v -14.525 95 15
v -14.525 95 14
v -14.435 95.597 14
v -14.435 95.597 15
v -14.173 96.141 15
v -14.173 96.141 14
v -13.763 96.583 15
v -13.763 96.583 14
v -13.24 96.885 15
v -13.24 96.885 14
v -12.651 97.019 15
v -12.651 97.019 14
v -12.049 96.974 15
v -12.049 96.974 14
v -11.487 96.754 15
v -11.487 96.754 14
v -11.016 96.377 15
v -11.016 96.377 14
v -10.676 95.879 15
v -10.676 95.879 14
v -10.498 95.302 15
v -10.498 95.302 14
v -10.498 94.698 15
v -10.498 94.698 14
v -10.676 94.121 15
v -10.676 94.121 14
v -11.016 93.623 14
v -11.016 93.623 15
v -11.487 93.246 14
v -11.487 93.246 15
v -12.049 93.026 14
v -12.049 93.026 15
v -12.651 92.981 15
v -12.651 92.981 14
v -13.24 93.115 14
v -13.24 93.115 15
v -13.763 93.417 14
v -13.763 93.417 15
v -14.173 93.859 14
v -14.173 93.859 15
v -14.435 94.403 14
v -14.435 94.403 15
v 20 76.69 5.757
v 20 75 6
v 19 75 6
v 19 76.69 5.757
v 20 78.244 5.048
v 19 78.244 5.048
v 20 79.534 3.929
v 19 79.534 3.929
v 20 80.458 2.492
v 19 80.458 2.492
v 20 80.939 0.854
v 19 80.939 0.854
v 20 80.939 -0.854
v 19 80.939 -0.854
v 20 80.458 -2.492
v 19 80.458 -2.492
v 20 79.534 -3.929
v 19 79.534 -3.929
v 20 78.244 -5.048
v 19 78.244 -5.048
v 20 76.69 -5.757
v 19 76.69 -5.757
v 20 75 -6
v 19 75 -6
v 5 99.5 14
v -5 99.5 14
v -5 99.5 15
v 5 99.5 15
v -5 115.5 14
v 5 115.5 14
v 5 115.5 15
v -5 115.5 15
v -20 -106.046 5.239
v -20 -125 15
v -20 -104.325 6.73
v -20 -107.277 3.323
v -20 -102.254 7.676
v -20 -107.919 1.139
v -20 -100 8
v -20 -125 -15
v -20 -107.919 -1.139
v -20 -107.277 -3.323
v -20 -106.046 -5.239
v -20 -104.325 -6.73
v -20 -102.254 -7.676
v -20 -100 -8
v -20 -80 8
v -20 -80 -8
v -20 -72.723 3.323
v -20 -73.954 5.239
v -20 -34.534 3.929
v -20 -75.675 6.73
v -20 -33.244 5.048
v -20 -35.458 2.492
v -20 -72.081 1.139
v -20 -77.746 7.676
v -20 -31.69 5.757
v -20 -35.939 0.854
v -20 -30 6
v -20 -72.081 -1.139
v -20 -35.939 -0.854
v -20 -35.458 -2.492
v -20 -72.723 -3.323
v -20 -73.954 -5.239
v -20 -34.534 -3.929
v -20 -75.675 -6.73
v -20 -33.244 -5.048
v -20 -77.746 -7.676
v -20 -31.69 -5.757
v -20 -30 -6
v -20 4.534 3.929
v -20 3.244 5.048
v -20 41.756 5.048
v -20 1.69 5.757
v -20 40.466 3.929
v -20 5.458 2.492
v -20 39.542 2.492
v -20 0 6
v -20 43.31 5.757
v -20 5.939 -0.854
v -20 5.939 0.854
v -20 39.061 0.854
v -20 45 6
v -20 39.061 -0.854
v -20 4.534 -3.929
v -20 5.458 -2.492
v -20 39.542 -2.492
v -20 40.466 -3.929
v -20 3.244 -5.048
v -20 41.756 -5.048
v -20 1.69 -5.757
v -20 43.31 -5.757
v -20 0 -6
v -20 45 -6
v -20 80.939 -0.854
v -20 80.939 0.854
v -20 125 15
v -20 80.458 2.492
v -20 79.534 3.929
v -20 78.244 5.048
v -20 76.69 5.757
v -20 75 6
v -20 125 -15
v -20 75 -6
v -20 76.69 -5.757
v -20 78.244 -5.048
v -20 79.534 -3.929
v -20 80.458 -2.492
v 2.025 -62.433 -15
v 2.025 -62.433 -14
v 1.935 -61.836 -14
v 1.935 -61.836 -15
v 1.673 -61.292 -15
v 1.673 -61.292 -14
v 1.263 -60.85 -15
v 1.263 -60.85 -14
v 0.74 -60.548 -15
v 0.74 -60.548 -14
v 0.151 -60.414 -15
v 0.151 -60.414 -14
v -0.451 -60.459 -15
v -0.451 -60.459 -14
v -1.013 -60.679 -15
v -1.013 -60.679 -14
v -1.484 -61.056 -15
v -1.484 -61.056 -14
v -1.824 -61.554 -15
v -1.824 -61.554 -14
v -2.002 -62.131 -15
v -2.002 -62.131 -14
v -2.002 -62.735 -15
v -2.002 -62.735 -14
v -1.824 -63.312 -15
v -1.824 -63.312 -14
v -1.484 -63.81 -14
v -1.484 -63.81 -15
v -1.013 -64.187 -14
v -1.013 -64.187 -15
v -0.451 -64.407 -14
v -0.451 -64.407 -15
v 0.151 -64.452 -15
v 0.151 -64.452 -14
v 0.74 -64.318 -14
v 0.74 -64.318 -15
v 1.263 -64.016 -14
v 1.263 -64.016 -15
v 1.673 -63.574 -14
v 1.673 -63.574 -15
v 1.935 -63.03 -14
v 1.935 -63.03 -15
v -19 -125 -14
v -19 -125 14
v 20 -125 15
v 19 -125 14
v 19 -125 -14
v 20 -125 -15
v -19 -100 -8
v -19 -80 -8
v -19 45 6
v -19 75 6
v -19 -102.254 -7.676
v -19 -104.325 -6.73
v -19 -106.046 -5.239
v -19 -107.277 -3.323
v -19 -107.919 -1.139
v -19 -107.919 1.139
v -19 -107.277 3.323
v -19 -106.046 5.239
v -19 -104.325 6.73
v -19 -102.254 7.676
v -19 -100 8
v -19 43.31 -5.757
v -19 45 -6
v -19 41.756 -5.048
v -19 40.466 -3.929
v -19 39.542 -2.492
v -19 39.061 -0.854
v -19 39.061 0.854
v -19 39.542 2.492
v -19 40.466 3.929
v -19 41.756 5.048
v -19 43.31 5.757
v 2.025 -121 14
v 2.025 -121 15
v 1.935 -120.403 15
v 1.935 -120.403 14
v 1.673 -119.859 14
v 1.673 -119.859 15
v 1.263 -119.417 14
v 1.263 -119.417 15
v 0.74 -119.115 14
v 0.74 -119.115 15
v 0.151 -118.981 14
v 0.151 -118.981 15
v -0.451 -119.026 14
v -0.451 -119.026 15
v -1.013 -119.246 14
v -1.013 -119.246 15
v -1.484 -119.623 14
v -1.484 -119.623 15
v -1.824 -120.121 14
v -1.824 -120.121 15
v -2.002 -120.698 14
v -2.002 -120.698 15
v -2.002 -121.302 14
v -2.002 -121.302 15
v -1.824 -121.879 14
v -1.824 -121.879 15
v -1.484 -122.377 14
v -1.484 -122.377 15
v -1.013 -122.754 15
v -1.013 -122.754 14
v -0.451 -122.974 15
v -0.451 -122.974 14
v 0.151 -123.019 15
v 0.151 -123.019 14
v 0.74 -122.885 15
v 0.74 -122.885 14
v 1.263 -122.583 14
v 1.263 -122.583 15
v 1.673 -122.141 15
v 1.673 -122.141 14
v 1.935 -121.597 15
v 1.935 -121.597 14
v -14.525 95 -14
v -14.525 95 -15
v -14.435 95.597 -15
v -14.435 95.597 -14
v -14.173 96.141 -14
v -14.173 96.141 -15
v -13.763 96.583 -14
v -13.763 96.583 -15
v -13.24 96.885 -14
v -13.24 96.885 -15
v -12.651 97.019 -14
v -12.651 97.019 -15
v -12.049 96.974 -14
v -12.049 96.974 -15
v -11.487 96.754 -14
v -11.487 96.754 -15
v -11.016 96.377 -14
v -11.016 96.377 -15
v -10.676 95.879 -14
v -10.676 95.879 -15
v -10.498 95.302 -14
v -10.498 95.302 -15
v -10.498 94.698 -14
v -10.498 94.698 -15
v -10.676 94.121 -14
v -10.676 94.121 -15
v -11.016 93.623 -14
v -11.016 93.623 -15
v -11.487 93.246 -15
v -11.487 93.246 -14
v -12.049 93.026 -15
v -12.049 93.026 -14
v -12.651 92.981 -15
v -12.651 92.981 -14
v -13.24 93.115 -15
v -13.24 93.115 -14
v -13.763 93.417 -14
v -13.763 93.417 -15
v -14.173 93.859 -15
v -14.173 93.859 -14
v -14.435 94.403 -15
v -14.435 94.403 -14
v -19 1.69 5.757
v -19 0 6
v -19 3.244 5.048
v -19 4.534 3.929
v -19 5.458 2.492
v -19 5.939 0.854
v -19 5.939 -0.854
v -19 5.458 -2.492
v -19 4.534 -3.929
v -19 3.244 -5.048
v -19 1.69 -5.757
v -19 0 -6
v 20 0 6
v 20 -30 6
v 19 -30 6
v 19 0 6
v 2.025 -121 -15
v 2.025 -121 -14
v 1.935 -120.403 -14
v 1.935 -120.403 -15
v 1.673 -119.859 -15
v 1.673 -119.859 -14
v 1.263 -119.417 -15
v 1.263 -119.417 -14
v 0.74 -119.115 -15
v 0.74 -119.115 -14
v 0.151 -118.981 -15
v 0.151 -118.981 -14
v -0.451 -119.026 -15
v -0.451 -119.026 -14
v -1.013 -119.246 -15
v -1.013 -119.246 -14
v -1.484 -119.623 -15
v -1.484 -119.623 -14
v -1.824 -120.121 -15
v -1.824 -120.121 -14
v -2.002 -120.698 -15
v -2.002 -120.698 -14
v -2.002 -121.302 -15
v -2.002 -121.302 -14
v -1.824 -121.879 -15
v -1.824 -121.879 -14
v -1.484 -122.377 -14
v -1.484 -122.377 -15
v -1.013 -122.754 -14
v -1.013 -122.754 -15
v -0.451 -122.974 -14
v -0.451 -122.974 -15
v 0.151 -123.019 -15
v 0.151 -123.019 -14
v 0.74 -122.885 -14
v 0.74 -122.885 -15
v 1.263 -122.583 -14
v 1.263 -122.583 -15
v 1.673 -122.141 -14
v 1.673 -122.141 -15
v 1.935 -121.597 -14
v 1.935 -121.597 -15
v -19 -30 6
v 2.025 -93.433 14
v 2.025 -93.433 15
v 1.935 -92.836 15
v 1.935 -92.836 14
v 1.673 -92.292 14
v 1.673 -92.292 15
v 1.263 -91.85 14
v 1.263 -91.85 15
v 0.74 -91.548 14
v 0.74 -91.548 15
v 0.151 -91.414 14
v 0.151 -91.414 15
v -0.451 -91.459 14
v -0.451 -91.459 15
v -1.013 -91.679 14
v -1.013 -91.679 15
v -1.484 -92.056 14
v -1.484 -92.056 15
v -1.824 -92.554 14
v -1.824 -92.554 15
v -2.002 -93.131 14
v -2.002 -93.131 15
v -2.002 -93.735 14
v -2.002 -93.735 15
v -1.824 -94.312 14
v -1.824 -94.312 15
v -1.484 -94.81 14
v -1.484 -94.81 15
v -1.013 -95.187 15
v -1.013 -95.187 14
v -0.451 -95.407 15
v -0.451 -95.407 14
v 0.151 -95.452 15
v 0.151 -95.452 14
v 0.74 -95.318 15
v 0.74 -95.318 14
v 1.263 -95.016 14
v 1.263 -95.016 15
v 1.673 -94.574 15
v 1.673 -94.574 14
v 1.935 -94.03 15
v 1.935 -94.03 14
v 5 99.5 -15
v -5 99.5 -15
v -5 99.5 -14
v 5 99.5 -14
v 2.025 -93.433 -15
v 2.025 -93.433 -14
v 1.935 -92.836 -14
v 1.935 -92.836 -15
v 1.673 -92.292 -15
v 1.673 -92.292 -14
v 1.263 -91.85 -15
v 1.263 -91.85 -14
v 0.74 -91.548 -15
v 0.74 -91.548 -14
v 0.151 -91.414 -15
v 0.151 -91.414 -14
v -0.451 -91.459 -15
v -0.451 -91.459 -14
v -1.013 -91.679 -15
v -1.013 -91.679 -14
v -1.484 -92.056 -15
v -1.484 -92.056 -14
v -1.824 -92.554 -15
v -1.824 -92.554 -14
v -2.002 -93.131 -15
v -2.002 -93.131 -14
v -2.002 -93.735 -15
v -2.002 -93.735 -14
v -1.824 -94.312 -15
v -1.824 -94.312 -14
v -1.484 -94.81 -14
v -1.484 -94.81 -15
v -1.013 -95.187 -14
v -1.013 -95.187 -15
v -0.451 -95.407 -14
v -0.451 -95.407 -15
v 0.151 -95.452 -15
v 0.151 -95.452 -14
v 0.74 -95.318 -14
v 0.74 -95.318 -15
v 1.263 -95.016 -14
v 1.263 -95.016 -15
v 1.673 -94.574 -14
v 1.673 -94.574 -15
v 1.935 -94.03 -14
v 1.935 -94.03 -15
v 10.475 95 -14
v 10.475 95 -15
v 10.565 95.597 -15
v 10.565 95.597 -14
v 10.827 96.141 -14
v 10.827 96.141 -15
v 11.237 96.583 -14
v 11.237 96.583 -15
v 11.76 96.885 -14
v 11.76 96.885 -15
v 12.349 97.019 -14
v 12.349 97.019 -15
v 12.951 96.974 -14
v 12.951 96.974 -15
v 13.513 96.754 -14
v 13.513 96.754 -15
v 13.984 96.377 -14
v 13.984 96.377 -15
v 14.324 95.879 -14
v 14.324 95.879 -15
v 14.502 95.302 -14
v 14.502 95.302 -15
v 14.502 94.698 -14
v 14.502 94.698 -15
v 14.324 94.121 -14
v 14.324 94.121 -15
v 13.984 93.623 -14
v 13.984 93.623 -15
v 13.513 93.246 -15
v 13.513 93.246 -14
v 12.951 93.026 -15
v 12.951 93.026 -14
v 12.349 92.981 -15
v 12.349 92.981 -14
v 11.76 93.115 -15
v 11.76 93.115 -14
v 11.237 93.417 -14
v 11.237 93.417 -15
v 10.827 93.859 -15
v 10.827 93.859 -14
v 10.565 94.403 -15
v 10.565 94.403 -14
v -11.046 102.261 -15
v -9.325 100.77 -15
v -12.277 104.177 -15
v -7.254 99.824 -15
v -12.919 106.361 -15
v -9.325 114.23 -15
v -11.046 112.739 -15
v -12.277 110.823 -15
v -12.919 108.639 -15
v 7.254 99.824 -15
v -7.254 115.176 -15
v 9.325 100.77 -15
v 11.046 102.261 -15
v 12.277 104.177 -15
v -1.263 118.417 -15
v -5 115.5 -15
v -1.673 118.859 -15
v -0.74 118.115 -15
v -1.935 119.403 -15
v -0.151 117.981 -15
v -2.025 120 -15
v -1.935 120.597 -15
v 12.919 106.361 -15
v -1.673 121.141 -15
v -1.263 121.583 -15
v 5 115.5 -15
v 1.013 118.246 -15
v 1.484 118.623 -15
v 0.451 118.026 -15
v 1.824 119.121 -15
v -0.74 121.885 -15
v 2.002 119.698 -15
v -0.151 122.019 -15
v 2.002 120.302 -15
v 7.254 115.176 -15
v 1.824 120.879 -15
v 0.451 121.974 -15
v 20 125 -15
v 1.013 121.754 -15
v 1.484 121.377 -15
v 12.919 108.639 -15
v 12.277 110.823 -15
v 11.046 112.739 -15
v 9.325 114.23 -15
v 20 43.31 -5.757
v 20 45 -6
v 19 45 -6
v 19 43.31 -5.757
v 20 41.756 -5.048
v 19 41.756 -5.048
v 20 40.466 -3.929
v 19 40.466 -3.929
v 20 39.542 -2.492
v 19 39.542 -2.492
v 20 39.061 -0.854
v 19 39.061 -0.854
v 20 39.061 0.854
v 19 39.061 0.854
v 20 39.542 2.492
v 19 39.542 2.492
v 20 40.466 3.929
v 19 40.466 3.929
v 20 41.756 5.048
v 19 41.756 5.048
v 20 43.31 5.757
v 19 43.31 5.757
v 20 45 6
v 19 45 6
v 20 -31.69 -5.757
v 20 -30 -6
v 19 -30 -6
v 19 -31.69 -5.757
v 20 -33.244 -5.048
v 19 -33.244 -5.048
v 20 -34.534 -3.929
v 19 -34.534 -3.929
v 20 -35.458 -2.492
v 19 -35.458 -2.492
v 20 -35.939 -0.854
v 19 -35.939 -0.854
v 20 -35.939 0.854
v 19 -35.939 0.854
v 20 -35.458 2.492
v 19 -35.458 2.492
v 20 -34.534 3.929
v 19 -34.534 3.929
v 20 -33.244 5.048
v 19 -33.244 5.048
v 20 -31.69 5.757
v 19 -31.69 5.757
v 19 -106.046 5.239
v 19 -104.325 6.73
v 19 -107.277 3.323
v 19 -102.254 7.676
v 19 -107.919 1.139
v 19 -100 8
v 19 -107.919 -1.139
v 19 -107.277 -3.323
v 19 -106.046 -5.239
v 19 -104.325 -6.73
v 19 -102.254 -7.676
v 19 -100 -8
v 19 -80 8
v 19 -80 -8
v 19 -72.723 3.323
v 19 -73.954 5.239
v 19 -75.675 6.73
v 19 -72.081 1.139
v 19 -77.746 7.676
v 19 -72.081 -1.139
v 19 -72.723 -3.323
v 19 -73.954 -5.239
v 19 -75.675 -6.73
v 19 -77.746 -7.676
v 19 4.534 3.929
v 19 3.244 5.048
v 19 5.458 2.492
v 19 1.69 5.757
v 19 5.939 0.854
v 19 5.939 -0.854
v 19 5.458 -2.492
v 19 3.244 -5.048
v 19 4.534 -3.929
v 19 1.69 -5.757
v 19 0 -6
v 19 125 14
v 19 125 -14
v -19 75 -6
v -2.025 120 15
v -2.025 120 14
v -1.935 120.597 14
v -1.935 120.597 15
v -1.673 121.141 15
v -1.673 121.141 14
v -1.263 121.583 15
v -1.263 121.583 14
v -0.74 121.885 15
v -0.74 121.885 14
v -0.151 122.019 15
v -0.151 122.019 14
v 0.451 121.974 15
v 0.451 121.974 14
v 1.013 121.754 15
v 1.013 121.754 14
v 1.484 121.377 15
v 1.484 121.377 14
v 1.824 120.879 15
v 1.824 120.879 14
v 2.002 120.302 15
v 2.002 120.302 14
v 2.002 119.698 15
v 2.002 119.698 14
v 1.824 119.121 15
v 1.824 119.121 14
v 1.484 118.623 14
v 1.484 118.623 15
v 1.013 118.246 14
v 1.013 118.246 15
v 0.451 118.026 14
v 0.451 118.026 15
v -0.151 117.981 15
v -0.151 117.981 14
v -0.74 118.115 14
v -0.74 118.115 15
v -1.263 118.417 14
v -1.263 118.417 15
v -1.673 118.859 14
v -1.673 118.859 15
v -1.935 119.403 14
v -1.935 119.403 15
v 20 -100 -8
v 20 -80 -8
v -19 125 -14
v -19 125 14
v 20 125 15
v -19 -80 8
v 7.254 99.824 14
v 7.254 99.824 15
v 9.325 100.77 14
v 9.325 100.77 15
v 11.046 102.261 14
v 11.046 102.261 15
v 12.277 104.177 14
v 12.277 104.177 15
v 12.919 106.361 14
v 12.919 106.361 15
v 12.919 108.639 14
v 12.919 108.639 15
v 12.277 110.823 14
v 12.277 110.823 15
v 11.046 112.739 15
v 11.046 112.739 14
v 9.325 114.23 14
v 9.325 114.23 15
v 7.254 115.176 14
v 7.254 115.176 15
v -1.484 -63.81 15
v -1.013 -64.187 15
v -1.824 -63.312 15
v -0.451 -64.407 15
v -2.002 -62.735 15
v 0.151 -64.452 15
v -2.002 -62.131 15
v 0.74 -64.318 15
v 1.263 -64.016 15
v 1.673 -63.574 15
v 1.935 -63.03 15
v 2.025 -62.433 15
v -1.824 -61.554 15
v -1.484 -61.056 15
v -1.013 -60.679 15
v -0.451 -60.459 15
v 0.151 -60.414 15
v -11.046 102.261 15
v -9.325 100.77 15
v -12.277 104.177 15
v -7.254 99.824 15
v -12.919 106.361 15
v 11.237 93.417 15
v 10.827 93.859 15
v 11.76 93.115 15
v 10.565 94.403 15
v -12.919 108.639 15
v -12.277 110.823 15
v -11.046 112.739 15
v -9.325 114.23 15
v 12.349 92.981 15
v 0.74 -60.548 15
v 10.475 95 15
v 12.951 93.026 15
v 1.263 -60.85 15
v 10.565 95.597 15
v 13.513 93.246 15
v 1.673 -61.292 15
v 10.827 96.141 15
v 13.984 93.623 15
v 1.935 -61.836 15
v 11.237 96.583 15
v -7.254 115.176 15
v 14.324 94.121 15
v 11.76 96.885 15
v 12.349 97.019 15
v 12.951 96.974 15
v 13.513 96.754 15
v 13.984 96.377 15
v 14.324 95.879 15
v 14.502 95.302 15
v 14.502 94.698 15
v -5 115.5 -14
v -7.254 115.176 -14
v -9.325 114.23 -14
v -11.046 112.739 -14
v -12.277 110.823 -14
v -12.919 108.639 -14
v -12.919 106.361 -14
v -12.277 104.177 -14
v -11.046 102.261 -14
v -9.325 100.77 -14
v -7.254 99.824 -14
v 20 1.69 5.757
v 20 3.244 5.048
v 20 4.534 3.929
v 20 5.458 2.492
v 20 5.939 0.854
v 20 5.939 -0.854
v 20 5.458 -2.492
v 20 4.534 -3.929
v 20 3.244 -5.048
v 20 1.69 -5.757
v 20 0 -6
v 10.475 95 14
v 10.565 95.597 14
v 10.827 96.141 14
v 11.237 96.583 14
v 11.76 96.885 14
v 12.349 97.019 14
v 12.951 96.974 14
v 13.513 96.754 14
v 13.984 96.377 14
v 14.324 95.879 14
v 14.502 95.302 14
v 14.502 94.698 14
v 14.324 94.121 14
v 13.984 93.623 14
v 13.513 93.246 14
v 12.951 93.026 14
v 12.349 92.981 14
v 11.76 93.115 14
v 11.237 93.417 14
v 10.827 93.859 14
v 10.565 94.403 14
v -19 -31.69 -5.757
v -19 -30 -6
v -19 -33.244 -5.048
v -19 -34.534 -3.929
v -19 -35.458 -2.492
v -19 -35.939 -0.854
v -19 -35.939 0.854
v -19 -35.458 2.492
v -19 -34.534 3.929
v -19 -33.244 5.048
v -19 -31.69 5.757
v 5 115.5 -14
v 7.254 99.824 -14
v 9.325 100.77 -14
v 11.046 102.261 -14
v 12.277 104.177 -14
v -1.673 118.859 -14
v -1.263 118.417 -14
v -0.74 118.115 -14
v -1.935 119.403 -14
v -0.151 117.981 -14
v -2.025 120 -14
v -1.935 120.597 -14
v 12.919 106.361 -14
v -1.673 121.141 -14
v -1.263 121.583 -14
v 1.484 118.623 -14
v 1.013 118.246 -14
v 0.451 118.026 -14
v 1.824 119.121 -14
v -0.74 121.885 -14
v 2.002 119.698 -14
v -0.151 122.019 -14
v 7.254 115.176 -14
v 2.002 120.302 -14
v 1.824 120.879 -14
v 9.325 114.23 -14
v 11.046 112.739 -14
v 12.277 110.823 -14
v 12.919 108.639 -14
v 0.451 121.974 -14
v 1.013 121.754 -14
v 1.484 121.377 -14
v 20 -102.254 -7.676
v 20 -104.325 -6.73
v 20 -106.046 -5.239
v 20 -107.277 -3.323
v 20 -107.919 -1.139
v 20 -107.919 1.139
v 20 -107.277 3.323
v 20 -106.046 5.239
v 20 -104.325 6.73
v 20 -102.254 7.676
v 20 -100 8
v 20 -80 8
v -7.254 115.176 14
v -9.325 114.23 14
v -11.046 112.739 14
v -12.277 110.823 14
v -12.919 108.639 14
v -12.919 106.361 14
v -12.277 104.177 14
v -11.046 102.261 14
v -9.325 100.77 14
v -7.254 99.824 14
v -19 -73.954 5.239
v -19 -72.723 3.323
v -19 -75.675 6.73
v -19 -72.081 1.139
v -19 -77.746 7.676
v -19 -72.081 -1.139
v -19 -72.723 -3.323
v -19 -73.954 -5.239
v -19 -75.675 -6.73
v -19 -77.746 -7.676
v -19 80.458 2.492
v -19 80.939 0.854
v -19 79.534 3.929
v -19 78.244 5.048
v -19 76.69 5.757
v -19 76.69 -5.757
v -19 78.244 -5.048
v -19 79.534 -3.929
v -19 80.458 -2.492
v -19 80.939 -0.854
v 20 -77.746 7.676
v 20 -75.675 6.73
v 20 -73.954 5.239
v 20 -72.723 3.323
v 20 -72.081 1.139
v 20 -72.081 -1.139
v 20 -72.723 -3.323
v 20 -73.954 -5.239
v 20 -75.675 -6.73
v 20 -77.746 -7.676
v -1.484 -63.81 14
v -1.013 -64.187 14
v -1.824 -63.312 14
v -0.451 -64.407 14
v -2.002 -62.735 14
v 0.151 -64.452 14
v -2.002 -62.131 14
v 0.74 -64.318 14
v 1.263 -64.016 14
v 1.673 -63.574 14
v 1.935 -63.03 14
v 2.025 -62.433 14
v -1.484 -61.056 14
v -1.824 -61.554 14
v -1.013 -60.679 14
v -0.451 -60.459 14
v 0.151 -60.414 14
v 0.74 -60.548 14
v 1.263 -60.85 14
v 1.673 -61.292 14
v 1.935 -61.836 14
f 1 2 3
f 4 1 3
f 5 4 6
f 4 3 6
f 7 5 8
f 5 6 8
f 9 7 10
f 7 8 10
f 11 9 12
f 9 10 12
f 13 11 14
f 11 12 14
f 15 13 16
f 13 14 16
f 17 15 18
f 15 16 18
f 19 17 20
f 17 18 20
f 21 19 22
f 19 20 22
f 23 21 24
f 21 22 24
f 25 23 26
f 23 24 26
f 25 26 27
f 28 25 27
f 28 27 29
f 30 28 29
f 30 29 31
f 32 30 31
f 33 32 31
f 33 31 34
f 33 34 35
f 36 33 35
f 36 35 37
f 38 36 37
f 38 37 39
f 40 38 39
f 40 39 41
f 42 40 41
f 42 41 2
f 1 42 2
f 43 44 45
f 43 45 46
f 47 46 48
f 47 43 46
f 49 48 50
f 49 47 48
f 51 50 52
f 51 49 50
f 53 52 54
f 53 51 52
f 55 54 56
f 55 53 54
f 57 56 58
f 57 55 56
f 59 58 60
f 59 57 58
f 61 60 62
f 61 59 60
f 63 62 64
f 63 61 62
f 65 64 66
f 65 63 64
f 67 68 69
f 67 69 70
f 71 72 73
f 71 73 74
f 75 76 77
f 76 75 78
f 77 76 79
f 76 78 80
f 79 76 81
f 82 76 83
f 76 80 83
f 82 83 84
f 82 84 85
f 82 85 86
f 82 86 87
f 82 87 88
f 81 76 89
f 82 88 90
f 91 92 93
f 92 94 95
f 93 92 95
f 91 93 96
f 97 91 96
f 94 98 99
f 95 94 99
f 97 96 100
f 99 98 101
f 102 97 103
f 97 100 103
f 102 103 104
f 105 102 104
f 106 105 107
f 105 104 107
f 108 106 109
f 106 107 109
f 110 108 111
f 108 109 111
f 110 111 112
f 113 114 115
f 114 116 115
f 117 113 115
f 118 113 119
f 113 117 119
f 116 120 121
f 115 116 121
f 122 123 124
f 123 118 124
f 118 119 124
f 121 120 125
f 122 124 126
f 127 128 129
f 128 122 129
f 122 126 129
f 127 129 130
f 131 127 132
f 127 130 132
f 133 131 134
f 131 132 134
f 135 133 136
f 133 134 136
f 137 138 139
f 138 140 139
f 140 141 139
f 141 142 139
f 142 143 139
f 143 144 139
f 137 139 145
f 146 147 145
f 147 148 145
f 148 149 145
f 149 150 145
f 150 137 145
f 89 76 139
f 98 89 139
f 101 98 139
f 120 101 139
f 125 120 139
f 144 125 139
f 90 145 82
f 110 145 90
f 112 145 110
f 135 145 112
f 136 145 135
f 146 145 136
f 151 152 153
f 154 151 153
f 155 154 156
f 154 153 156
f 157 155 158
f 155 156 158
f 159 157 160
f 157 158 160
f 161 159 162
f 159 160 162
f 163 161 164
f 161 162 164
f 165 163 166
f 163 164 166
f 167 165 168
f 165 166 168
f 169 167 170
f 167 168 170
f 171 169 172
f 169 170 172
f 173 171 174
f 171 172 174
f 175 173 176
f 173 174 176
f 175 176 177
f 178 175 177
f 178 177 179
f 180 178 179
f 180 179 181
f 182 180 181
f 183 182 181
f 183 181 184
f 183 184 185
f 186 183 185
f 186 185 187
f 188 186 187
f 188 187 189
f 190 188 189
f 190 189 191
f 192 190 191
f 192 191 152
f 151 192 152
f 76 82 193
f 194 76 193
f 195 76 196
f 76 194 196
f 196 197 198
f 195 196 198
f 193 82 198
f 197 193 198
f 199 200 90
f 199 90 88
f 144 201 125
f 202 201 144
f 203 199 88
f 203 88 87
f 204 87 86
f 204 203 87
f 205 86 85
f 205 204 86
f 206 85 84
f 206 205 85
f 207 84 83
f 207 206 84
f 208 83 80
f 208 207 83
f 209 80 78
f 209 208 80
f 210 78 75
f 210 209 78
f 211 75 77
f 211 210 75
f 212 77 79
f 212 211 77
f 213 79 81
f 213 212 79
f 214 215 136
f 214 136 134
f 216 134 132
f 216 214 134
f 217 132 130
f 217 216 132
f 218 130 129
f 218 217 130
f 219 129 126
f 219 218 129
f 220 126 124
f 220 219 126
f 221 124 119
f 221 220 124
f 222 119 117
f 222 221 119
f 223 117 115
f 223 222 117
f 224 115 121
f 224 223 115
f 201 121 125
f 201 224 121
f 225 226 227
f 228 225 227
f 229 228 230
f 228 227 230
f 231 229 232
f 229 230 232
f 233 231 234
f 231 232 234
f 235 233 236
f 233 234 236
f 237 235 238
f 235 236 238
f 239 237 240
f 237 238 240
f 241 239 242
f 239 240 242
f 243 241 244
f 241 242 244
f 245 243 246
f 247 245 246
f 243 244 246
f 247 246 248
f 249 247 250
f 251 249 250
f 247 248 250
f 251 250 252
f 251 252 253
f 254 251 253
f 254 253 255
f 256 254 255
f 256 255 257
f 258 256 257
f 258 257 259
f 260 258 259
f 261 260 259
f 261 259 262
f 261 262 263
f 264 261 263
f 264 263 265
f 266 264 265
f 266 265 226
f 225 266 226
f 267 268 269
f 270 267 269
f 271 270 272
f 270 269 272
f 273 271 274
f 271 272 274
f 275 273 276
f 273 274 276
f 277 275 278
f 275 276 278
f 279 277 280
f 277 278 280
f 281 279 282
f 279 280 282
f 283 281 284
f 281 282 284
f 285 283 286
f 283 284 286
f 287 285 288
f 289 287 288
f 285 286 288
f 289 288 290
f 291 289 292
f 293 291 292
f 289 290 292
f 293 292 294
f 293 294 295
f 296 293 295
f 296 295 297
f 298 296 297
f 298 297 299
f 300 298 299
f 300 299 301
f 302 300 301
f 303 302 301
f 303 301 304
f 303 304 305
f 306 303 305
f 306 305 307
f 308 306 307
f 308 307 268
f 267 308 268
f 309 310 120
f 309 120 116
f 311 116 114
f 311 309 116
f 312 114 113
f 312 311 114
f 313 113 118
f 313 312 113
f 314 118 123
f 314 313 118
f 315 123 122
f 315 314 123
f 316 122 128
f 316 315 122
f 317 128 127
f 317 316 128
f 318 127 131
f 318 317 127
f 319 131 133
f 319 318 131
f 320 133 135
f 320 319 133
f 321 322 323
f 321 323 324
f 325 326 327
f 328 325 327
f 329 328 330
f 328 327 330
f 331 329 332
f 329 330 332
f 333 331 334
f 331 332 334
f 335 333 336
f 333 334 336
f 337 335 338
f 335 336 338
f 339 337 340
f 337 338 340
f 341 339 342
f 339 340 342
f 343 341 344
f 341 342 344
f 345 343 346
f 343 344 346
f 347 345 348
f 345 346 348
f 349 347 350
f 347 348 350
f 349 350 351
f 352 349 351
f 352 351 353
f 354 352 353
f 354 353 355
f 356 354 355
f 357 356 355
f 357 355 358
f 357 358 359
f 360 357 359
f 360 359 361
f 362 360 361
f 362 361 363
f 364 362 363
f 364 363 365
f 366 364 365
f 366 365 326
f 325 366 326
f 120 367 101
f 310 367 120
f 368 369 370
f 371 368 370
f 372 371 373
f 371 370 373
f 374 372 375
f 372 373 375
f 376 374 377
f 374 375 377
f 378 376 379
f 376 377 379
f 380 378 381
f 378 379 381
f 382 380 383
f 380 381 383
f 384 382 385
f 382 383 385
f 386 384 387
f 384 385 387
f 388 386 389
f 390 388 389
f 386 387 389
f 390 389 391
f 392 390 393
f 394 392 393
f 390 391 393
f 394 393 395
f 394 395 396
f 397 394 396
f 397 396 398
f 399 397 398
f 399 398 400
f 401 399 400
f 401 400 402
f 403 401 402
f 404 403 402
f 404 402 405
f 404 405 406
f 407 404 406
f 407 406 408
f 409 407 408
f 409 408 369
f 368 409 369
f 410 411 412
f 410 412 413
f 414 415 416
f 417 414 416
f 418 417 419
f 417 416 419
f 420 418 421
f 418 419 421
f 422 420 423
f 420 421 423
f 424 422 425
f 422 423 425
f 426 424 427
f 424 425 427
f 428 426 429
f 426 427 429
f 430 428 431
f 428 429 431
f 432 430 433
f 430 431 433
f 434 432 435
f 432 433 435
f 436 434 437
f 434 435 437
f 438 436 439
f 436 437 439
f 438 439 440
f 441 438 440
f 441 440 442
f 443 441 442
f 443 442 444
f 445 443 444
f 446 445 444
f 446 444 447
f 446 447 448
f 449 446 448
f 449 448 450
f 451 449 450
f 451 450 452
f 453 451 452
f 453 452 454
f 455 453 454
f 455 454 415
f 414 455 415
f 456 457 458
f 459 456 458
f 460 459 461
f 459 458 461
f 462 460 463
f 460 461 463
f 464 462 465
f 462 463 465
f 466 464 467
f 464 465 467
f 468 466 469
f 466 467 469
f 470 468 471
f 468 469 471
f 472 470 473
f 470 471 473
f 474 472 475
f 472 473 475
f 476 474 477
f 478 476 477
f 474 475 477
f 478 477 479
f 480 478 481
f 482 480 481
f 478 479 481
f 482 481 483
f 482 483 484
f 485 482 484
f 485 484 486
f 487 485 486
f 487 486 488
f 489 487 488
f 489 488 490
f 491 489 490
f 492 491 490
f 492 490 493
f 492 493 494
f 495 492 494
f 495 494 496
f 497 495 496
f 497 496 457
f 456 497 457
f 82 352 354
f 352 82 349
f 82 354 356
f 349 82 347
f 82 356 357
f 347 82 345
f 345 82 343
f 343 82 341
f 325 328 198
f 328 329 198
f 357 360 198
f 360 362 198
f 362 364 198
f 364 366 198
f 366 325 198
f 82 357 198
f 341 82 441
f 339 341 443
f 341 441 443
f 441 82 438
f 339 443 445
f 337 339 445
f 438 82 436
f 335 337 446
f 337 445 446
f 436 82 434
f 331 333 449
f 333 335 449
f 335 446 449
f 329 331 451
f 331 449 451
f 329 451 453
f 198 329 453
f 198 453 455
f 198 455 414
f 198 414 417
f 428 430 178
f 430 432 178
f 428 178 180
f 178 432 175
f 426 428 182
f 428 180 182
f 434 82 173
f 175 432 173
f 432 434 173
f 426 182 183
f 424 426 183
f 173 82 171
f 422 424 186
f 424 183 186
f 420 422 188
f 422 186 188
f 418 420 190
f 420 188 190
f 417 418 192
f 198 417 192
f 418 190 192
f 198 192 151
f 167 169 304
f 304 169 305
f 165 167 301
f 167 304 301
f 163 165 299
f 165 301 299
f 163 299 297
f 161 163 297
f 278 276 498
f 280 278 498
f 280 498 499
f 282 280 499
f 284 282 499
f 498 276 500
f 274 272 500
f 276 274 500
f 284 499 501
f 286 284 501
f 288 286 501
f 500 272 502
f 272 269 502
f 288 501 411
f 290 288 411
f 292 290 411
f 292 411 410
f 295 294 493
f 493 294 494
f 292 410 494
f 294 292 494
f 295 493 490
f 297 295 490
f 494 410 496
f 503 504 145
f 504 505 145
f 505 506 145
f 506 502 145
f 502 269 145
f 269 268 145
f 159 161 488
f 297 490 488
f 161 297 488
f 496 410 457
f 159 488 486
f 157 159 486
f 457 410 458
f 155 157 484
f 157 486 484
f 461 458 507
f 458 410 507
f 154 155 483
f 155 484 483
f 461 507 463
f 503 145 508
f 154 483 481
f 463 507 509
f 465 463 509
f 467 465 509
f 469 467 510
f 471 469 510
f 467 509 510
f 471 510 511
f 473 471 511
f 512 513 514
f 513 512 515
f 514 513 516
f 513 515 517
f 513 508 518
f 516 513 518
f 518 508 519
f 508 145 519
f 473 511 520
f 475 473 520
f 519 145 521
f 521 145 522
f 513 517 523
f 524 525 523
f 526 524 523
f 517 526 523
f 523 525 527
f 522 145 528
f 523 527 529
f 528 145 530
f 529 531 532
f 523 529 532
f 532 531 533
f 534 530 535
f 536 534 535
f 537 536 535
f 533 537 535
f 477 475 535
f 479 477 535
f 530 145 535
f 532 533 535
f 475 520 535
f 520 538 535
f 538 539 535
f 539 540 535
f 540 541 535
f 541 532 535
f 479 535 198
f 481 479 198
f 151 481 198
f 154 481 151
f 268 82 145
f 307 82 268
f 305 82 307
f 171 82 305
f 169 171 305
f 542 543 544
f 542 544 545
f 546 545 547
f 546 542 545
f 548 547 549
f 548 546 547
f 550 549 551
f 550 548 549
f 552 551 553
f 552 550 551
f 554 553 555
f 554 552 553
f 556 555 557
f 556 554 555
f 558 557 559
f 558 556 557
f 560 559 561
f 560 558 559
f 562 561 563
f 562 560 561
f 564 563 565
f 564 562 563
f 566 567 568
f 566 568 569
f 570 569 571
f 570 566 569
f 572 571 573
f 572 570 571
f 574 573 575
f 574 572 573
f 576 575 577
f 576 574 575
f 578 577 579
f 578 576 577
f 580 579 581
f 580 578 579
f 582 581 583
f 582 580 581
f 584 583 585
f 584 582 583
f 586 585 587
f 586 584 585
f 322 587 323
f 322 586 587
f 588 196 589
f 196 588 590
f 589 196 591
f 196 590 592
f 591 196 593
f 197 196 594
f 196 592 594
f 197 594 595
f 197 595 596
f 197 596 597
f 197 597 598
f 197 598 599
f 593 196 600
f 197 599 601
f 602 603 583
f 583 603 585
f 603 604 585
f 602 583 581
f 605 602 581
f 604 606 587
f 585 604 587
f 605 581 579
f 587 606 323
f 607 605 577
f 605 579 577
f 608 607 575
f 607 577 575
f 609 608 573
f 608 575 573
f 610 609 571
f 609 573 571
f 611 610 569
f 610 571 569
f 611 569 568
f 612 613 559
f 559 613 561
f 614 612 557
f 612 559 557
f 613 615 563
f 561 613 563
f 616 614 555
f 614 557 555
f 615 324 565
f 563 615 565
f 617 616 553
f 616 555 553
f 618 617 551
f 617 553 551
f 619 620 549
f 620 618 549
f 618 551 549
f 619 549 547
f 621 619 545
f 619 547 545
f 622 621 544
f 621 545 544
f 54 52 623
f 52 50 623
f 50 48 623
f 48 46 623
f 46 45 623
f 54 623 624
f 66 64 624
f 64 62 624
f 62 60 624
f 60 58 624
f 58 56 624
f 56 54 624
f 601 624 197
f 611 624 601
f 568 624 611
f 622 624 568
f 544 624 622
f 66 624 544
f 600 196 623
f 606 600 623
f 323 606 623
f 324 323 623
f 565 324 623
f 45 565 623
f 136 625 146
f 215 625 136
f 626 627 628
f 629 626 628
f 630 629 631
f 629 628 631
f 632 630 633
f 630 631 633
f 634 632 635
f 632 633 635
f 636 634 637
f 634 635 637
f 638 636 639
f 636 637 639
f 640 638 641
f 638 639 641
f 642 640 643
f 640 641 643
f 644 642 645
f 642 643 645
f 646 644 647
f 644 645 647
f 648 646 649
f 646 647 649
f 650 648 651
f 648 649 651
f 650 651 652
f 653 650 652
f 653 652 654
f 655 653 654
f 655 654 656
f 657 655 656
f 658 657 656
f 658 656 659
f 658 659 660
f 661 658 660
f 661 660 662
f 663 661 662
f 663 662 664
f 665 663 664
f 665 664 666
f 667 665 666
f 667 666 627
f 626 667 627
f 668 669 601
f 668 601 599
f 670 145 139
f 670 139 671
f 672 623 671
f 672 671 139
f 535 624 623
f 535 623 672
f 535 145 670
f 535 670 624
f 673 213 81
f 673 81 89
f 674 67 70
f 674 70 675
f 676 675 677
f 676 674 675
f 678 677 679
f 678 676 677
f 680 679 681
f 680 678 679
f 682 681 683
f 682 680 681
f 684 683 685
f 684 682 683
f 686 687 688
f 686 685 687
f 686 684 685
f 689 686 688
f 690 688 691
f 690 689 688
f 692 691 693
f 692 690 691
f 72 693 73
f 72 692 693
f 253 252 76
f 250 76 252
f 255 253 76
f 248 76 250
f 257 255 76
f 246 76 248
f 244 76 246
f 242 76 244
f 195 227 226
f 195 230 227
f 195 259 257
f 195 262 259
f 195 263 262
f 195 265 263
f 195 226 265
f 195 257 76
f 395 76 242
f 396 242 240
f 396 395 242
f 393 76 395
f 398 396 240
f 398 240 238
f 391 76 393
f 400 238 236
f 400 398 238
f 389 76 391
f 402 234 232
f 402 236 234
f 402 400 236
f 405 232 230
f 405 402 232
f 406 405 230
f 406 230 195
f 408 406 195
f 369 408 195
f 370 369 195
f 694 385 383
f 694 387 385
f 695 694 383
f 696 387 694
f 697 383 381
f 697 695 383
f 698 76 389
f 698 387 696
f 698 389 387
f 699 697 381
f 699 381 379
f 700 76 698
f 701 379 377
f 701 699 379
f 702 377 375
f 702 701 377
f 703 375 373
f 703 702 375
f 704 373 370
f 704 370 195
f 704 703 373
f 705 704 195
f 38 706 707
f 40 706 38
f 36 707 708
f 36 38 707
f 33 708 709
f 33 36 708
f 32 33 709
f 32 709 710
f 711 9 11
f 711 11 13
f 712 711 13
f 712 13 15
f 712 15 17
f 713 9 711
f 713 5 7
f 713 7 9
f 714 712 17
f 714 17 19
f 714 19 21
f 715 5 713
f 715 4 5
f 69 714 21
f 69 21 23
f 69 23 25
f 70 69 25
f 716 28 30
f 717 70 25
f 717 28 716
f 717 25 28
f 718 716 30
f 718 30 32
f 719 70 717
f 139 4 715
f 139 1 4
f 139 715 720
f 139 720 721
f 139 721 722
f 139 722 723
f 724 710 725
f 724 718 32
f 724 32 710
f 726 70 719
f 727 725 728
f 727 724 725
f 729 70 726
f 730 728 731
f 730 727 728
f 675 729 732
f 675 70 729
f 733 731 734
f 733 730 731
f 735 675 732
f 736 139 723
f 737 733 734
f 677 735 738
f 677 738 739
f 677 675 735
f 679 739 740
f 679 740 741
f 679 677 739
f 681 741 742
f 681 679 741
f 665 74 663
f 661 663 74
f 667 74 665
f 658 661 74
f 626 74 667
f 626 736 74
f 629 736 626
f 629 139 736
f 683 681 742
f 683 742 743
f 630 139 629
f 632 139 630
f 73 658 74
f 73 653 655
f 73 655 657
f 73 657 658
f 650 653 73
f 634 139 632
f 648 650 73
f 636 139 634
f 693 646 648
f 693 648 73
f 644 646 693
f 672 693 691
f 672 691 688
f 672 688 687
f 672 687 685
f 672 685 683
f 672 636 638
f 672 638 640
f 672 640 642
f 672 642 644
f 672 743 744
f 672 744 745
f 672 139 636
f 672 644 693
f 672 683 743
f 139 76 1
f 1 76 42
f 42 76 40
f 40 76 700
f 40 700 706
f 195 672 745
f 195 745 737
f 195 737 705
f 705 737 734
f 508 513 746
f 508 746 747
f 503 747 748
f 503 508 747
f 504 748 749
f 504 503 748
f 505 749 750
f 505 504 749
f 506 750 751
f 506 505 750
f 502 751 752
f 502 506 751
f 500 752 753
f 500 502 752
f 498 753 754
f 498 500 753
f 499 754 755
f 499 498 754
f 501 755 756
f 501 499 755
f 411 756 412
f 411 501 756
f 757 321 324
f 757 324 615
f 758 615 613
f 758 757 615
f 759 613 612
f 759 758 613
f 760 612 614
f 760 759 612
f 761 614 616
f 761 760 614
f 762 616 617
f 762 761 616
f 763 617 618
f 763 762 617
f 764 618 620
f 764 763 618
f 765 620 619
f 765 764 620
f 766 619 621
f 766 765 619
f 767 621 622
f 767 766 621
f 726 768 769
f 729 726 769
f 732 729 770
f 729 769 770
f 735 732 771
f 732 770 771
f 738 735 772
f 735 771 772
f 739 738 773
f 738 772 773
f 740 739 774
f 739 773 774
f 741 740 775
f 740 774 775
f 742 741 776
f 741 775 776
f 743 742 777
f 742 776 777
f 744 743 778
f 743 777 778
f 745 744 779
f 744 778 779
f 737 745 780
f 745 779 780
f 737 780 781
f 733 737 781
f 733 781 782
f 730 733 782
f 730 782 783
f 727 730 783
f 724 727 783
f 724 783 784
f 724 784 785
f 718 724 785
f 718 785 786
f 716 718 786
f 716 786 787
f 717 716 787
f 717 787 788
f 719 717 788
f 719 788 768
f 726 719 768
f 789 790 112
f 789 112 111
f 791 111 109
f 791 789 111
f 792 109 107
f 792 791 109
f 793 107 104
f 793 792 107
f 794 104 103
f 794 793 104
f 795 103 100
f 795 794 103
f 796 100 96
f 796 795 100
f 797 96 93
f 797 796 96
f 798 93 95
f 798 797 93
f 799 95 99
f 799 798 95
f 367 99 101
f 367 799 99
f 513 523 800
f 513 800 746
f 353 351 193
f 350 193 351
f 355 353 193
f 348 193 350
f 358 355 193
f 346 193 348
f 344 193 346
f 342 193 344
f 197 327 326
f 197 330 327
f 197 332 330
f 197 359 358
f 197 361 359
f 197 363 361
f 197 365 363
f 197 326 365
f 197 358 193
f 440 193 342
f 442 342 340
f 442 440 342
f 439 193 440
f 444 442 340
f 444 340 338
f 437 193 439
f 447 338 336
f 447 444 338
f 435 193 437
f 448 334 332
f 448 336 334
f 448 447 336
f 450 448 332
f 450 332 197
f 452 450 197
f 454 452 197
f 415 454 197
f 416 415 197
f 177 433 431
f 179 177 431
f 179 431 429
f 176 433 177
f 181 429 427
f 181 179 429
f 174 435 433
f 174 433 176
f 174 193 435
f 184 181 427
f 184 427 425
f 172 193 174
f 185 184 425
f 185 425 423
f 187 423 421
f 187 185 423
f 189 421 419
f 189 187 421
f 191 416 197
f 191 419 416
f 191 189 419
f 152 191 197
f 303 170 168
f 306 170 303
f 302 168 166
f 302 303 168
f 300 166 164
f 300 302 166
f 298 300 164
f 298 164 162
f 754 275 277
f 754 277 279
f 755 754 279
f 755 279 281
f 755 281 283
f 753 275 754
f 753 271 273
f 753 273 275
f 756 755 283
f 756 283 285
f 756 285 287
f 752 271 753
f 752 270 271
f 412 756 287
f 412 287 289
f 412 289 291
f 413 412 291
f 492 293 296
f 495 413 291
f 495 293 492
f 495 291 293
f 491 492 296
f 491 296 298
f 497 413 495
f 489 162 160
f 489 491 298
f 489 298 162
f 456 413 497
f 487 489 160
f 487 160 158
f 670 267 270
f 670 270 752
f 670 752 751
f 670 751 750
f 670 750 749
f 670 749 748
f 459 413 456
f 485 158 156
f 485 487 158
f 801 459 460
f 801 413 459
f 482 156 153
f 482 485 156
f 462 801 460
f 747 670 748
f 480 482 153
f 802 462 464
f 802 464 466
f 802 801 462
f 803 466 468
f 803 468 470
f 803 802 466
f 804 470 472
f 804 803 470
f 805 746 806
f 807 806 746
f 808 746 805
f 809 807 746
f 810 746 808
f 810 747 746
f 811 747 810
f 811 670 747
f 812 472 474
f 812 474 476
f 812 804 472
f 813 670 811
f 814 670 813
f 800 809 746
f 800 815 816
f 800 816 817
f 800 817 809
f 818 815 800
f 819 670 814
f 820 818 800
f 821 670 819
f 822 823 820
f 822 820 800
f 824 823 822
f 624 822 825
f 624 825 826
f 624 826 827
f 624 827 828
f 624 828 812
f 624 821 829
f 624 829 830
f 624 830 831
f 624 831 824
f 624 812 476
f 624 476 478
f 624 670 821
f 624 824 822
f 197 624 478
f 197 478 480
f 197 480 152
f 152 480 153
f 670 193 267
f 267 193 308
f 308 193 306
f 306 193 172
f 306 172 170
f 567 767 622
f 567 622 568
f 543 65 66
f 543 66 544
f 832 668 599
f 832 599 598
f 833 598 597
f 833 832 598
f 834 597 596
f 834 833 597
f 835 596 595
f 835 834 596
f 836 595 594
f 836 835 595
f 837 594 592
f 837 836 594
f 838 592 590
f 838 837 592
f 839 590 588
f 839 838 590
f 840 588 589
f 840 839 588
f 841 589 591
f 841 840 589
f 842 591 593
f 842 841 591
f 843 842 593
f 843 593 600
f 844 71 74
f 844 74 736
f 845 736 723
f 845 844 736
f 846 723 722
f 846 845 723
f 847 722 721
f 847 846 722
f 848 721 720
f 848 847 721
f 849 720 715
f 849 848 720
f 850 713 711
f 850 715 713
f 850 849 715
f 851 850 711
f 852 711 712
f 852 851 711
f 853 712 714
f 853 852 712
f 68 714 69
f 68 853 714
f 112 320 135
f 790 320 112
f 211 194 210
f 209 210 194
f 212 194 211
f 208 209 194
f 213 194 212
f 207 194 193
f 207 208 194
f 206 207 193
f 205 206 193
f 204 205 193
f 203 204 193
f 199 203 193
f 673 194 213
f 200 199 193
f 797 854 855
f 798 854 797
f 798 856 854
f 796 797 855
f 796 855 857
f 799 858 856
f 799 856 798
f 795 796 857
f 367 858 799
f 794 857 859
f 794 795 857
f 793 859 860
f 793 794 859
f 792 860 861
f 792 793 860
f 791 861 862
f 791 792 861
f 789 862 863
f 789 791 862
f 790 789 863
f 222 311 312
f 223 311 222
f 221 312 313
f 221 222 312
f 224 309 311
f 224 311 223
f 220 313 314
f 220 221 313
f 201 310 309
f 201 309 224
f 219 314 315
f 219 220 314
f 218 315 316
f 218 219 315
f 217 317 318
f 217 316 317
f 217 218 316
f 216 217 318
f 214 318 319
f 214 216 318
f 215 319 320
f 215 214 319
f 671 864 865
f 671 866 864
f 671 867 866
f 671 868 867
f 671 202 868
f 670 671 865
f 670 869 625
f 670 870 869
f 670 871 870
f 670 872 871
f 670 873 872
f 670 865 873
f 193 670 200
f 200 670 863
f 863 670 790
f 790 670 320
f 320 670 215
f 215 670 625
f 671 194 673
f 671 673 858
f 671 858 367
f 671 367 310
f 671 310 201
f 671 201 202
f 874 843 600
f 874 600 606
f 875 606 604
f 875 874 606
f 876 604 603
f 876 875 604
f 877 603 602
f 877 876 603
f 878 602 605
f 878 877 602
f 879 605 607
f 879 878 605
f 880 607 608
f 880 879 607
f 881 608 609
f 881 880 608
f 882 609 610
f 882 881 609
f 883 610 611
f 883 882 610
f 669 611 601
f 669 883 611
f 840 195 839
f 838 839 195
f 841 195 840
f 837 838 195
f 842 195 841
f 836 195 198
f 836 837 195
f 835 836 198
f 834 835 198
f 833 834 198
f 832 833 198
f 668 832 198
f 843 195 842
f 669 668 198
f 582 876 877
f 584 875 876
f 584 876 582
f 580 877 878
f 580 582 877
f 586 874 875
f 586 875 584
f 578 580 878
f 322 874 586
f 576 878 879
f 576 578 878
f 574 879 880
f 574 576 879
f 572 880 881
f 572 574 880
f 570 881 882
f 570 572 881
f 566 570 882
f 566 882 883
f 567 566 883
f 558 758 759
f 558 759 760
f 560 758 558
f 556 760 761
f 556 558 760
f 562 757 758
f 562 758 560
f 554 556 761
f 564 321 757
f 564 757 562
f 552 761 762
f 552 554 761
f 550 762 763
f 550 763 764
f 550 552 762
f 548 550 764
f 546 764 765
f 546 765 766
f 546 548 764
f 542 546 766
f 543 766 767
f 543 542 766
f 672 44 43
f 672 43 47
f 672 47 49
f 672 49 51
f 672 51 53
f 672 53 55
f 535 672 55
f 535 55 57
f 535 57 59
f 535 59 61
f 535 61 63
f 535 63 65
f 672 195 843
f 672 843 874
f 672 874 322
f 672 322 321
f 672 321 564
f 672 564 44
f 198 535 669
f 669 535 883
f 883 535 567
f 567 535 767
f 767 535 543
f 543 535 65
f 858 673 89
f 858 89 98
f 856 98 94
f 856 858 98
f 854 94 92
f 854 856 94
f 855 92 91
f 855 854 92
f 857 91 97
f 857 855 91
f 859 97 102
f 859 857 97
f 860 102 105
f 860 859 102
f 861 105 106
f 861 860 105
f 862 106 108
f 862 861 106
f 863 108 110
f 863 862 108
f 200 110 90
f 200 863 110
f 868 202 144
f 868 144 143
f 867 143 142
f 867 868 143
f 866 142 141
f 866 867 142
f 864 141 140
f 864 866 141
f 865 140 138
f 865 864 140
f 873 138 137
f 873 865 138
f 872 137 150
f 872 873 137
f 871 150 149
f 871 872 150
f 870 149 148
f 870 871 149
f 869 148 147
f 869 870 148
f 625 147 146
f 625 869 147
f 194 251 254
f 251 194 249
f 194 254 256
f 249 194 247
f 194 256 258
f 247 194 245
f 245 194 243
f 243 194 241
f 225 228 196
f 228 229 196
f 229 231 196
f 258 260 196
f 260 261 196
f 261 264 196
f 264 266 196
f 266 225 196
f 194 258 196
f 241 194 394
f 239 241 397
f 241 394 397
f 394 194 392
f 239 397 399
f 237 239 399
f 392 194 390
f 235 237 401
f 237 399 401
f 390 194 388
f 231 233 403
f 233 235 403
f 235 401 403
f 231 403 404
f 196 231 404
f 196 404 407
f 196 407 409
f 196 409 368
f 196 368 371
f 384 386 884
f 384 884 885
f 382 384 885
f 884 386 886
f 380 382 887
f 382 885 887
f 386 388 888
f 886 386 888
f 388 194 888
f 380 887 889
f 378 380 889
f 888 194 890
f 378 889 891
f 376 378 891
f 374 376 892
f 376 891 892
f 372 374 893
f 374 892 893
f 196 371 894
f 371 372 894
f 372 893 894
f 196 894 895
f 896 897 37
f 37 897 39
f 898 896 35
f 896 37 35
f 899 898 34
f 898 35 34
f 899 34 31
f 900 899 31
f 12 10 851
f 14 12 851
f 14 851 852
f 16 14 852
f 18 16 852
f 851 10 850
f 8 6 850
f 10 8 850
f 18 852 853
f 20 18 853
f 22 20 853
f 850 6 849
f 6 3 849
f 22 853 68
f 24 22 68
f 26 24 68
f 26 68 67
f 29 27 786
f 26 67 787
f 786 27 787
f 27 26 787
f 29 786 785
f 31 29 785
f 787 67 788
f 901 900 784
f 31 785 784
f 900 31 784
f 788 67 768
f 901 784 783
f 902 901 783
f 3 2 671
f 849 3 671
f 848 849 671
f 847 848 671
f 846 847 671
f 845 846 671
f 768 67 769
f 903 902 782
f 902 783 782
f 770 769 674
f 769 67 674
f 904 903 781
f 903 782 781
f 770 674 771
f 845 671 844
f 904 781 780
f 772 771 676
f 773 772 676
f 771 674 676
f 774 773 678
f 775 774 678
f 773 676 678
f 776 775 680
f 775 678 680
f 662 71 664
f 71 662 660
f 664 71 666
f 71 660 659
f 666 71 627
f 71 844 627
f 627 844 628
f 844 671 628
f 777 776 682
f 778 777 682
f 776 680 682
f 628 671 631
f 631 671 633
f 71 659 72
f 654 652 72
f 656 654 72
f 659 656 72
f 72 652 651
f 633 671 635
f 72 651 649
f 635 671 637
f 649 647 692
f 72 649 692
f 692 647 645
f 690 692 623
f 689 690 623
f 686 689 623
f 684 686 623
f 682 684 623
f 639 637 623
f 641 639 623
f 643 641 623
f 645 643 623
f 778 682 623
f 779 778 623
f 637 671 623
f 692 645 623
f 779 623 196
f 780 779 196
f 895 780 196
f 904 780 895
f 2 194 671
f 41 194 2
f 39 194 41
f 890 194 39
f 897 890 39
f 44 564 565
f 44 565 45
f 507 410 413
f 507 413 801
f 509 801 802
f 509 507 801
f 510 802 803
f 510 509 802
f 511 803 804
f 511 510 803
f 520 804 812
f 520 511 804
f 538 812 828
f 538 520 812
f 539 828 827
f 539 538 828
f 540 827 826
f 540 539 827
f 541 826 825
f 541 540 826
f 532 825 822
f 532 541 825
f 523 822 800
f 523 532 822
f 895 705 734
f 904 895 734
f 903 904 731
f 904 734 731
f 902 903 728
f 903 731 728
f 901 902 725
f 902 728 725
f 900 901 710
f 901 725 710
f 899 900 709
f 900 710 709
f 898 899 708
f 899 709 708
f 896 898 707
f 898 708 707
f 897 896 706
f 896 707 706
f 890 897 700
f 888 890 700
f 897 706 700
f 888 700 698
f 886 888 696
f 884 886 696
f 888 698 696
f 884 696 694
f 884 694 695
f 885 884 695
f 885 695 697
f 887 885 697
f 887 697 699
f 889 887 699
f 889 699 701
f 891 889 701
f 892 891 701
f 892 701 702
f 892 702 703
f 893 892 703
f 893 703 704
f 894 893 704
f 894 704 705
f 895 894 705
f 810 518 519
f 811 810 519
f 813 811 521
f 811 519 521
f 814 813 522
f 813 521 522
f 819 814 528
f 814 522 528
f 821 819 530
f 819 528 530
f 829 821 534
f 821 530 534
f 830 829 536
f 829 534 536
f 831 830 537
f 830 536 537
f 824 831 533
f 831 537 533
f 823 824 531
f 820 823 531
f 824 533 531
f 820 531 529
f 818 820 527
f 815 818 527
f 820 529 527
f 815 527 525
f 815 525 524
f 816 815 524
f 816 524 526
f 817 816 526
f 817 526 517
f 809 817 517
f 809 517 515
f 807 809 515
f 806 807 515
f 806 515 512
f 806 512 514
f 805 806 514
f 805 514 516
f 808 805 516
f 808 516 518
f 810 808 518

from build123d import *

# Parameters (mm, degrees)
SKETCH_1_W               = 40
SKETCH_1_H               = 30
EXTRUDE_1_DEPTH          = 125
SKETCH_2_W               = 38
SKETCH_2_H               = 28
CUT_EXTRUDE_1_DEPTH      = 126
CUT_EXTRUDE_1_DEPTH_BACK = 126
SKETCH_3_R               = 2.025
CUT_EXTRUDE_2_DEPTH      = 1
CUT_EXTRUDE_2_DEPTH_BACK = 31
SKETCH_4_R               = 2.025
CUT_EXTRUDE_3_DEPTH      = 1
CUT_EXTRUDE_3_DEPTH_BACK = 31
CUT_EXTRUDE_4_DEPTH      = 1
CUT_EXTRUDE_4_DEPTH_BACK = 41
CUT_EXTRUDE_5_DEPTH      = 1
CUT_EXTRUDE_5_DEPTH_BACK = 31
CUT_EXTRUDE_6_DEPTH      = 1
CUT_EXTRUDE_6_DEPTH_BACK = 41


with BuildPart() as part:
    # 草图1 → 凸台-拉伸1 (new body, symmetric)
    with BuildSketch(Plane(origin=(0, 0, 0), x_dir=(1, 0, 0), z_dir=(0, 1, 0))):
        Rectangle(SKETCH_1_W, SKETCH_1_H)
    extrude(amount=EXTRUDE_1_DEPTH, both=True)

    # 草图2 → 切除-拉伸1 (cut, two sides)
    with BuildSketch(Plane(origin=(0, 0, 0), x_dir=(1, 0, 0), z_dir=(0, 1, 0))) as cut_extrude_1_sk:
        Rectangle(SKETCH_2_W, SKETCH_2_H)
    extrude(amount=CUT_EXTRUDE_1_DEPTH, mode=Mode.SUBTRACT)
    extrude(cut_extrude_1_sk.sketch, amount=-CUT_EXTRUDE_1_DEPTH_BACK, mode=Mode.SUBTRACT)

    # 草图3 → 切除-拉伸2 (cut, two sides)
    with BuildSketch(Plane.XY.offset(15)) as cut_extrude_2_sk:
        with Locations((0, -62.433034374)):
            Circle(SKETCH_3_R)
        with Locations((0, -93.433034374)):
            Circle(SKETCH_3_R)
        with Locations((0, -121)):
            Circle(SKETCH_3_R)
    extrude(amount=CUT_EXTRUDE_2_DEPTH, mode=Mode.SUBTRACT)
    extrude(cut_extrude_2_sk.sketch, amount=-CUT_EXTRUDE_2_DEPTH_BACK, mode=Mode.SUBTRACT)

    # 草图4 → 切除-拉伸3 (cut, two sides)
    with BuildSketch(Plane(origin=(0, 0, -15), x_dir=(-1, 0, 0), z_dir=(0, 0, -1))) as cut_extrude_3_sk:
        with Locations((0, 120)):
            Circle(SKETCH_4_R)
        with Locations((12.5, 95)):
            Circle(SKETCH_4_R)
        with Locations((-12.5, 95)):
            Circle(SKETCH_4_R)
    extrude(amount=CUT_EXTRUDE_3_DEPTH, mode=Mode.SUBTRACT)
    extrude(cut_extrude_3_sk.sketch, amount=-CUT_EXTRUDE_3_DEPTH_BACK, mode=Mode.SUBTRACT)

    # 草图5 → 切除-拉伸4 (cut, two sides)
    with BuildSketch(Plane(origin=(20, 0, 0), x_dir=(0, 0, -1), z_dir=(1, 0, 0))) as cut_extrude_4_sk:
        with BuildLine():
            Line((-8, -100), (-8, -80))
            ThreePointArc((-8, -80), (0, -72), (8, -80))
            Line((8, -80), (8, -100))
            ThreePointArc((8, -100), (0, -108), (-8, -100))
        make_face()
    extrude(amount=CUT_EXTRUDE_4_DEPTH, mode=Mode.SUBTRACT)
    extrude(cut_extrude_4_sk.sketch, amount=-CUT_EXTRUDE_4_DEPTH_BACK, mode=Mode.SUBTRACT)

    # 草图6 → 切除-拉伸5 (cut, two sides)
    with BuildSketch(Plane(origin=(0, 0, -15), x_dir=(-1, 0, 0), z_dir=(0, 0, -1))) as cut_extrude_5_sk:
        with BuildLine():
            Line((-5, 115.5), (5, 115.5))
            ThreePointArc((5, 115.5), (13, 107.5), (5, 99.5))
            Line((5, 99.5), (-5, 99.5))
            ThreePointArc((-5, 99.5), (-13, 107.5), (-5, 115.5))
        make_face()
    extrude(amount=CUT_EXTRUDE_5_DEPTH, mode=Mode.SUBTRACT)
    extrude(cut_extrude_5_sk.sketch, amount=-CUT_EXTRUDE_5_DEPTH_BACK, mode=Mode.SUBTRACT)

    # 草图7 → 切除-拉伸6 (cut, two sides)
    with BuildSketch(Plane(origin=(20, 0, 0), x_dir=(0, 0, -1), z_dir=(1, 0, 0))) as cut_extrude_6_sk:
        with BuildLine():
            Line((-6, 45), (-6, 75))
            ThreePointArc((-6, 75), (0, 81), (6, 75))
            Line((6, 75), (6, 45))
            ThreePointArc((6, 45), (0, 39), (-6, 45))
        make_face()
        with BuildLine():
            Line((-6, -30), (-6, 0))
            ThreePointArc((-6, 0), (0, 6), (6, 0))
            Line((6, 0), (6, -30))
            ThreePointArc((6, -30), (0, -36), (-6, -30))
        make_face()
    extrude(amount=CUT_EXTRUDE_6_DEPTH, mode=Mode.SUBTRACT)
    extrude(cut_extrude_6_sk.sketch, amount=-CUT_EXTRUDE_6_DEPTH_BACK, mode=Mode.SUBTRACT)


solid = part.part
